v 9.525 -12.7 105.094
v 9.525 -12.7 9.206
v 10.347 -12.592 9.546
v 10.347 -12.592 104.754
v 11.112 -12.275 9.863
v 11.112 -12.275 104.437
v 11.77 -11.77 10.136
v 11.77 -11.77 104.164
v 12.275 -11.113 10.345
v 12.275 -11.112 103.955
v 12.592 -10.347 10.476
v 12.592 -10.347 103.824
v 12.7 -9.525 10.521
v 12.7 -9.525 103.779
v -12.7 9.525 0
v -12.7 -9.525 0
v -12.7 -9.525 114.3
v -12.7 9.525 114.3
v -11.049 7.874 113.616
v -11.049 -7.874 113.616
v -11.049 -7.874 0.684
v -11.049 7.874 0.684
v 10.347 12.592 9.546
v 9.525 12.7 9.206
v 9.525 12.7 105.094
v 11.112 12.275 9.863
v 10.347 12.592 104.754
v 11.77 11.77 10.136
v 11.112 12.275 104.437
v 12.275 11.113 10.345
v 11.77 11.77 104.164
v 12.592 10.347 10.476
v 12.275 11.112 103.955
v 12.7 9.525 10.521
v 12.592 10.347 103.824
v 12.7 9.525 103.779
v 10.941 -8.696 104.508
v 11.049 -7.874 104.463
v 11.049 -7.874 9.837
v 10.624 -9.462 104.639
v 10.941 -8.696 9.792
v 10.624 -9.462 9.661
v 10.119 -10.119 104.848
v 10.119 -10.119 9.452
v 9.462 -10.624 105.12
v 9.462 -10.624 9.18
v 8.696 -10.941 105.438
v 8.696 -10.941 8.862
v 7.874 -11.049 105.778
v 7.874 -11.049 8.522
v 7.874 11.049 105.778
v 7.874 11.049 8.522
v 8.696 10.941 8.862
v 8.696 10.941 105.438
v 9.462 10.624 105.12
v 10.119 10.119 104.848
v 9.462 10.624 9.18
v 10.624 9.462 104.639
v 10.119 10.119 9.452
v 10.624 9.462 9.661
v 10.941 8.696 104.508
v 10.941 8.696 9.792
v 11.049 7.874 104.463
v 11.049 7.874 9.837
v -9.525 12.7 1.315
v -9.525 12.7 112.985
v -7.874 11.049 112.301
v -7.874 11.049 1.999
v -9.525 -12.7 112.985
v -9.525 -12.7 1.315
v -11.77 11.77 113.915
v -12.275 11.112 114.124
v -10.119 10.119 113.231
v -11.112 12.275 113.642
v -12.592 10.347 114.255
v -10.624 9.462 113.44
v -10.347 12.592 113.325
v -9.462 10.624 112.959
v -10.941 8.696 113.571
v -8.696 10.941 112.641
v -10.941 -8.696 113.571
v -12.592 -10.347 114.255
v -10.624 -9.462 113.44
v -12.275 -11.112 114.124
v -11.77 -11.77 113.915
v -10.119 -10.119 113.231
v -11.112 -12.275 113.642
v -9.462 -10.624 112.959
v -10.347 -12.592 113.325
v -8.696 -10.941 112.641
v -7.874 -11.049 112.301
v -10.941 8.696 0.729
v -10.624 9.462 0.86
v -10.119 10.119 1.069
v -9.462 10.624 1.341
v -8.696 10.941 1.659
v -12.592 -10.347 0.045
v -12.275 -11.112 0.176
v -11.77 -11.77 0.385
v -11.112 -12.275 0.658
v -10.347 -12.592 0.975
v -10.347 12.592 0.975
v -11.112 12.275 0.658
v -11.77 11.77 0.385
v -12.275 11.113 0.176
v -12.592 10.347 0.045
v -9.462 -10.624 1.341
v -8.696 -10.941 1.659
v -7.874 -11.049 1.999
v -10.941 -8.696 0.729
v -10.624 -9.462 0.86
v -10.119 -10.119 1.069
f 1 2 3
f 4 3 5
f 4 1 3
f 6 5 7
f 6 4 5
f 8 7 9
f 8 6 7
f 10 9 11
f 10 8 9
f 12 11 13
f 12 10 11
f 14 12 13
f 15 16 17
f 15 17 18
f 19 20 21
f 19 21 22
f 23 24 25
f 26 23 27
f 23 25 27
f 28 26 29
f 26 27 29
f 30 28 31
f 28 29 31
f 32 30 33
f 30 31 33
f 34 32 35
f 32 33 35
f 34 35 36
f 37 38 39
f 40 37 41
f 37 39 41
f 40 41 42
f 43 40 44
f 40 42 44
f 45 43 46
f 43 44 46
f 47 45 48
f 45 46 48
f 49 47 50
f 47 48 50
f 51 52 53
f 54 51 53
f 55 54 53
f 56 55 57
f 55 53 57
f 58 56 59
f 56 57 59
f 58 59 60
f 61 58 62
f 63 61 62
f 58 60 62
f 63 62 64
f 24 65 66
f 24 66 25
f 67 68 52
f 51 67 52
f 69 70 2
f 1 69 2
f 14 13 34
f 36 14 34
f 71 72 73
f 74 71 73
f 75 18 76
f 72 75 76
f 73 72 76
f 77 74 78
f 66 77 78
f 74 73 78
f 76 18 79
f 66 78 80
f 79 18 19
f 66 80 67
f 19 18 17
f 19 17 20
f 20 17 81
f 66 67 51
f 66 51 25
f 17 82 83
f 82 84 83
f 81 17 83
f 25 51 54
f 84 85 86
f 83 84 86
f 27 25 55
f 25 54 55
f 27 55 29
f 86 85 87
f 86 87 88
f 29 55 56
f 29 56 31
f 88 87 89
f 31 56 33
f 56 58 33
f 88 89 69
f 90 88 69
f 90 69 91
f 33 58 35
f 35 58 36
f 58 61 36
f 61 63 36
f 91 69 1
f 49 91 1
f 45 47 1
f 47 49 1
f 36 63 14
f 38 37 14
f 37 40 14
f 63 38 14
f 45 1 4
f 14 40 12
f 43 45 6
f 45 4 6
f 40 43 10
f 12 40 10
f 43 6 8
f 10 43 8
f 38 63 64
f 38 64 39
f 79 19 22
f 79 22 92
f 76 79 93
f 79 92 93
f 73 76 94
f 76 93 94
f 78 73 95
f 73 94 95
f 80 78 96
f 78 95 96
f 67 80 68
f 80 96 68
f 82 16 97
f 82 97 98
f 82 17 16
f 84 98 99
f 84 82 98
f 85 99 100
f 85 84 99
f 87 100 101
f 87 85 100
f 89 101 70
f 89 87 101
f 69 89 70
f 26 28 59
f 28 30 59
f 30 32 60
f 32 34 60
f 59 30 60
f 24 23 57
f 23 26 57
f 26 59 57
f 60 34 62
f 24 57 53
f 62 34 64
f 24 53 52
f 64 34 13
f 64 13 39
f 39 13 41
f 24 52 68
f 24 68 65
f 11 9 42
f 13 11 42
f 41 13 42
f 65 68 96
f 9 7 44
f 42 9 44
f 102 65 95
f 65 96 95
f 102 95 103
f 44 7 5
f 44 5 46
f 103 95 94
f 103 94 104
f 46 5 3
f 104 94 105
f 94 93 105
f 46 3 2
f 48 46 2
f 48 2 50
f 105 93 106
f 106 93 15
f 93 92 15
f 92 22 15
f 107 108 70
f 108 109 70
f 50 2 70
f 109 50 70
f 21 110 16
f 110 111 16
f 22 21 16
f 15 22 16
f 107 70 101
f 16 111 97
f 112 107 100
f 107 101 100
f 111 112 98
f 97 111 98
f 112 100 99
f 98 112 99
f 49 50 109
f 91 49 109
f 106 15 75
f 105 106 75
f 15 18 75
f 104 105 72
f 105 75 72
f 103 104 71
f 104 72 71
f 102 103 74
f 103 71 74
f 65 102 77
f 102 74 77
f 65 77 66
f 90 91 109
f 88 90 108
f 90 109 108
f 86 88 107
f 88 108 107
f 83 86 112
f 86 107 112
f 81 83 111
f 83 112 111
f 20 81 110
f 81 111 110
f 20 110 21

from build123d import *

# Parameters (mm, degrees)
F1_W     = 25.4
F1_H     = 25.4
F2_DEPTH = 114.3
F4_DEPTH = 25.4
F5_R     = 3.175


# Not quite as in the source:
# - a variable given as a bare number and used for a length is read in inches; the dataset says mm whatever the document's units were


with BuildPart() as f2:
    # F1 (on Top) → F2 (new body)
    with BuildSketch(Plane.XY):
        Rectangle(F1_W, F1_H)
        with BuildLine():
            ThreePointArc((-11.049, 7.874), (-10.1190640303, 10.1190640303), (-7.874, 11.049))
            Line((-7.874, 11.049), (7.874, 11.049))
            ThreePointArc((7.874, 11.049), (10.1190640303, 10.1190640303), (11.049, 7.874))
            Line((11.049, 7.874), (11.049, -7.874))
            ThreePointArc((11.049, -7.874), (10.1190640303, -10.1190640303), (7.874, -11.049))
            Line((7.874, -11.049), (-7.874, -11.049))
            ThreePointArc((-7.874, -11.049), (-10.1190640303, -10.1190640303), (-11.049, -7.874))
            Line((-11.049, -7.874), (-11.049, 7.874))
        make_face(mode=Mode.SUBTRACT)
    extrude(amount=F2_DEPTH)

    # F3 (on face) → F4 (cut)
    with BuildSketch(Plane.XZ.offset(12.7)):
        Polygon((12.7, 10.5210244843), (-12.7, 0), (12.7, 0), align=None)
        Polygon((12.7, 114.3), (-12.7, 114.3), (12.7, 103.7789755157), align=None)
    extrude(amount=-F4_DEPTH, mode=Mode.SUBTRACT)

    # F5
    f5_edges = [f2.edges().sort_by_distance(p)[0] for p in [
        (-12.7, 12.7, 57.15),
        (12.7, 12.7, 57.15),
        (-12.7, -12.7, 57.15),
        (12.7, -12.7, 57.15),
    ]]
    fillet(f5_edges, radius=F5_R)


solid = f2.part
